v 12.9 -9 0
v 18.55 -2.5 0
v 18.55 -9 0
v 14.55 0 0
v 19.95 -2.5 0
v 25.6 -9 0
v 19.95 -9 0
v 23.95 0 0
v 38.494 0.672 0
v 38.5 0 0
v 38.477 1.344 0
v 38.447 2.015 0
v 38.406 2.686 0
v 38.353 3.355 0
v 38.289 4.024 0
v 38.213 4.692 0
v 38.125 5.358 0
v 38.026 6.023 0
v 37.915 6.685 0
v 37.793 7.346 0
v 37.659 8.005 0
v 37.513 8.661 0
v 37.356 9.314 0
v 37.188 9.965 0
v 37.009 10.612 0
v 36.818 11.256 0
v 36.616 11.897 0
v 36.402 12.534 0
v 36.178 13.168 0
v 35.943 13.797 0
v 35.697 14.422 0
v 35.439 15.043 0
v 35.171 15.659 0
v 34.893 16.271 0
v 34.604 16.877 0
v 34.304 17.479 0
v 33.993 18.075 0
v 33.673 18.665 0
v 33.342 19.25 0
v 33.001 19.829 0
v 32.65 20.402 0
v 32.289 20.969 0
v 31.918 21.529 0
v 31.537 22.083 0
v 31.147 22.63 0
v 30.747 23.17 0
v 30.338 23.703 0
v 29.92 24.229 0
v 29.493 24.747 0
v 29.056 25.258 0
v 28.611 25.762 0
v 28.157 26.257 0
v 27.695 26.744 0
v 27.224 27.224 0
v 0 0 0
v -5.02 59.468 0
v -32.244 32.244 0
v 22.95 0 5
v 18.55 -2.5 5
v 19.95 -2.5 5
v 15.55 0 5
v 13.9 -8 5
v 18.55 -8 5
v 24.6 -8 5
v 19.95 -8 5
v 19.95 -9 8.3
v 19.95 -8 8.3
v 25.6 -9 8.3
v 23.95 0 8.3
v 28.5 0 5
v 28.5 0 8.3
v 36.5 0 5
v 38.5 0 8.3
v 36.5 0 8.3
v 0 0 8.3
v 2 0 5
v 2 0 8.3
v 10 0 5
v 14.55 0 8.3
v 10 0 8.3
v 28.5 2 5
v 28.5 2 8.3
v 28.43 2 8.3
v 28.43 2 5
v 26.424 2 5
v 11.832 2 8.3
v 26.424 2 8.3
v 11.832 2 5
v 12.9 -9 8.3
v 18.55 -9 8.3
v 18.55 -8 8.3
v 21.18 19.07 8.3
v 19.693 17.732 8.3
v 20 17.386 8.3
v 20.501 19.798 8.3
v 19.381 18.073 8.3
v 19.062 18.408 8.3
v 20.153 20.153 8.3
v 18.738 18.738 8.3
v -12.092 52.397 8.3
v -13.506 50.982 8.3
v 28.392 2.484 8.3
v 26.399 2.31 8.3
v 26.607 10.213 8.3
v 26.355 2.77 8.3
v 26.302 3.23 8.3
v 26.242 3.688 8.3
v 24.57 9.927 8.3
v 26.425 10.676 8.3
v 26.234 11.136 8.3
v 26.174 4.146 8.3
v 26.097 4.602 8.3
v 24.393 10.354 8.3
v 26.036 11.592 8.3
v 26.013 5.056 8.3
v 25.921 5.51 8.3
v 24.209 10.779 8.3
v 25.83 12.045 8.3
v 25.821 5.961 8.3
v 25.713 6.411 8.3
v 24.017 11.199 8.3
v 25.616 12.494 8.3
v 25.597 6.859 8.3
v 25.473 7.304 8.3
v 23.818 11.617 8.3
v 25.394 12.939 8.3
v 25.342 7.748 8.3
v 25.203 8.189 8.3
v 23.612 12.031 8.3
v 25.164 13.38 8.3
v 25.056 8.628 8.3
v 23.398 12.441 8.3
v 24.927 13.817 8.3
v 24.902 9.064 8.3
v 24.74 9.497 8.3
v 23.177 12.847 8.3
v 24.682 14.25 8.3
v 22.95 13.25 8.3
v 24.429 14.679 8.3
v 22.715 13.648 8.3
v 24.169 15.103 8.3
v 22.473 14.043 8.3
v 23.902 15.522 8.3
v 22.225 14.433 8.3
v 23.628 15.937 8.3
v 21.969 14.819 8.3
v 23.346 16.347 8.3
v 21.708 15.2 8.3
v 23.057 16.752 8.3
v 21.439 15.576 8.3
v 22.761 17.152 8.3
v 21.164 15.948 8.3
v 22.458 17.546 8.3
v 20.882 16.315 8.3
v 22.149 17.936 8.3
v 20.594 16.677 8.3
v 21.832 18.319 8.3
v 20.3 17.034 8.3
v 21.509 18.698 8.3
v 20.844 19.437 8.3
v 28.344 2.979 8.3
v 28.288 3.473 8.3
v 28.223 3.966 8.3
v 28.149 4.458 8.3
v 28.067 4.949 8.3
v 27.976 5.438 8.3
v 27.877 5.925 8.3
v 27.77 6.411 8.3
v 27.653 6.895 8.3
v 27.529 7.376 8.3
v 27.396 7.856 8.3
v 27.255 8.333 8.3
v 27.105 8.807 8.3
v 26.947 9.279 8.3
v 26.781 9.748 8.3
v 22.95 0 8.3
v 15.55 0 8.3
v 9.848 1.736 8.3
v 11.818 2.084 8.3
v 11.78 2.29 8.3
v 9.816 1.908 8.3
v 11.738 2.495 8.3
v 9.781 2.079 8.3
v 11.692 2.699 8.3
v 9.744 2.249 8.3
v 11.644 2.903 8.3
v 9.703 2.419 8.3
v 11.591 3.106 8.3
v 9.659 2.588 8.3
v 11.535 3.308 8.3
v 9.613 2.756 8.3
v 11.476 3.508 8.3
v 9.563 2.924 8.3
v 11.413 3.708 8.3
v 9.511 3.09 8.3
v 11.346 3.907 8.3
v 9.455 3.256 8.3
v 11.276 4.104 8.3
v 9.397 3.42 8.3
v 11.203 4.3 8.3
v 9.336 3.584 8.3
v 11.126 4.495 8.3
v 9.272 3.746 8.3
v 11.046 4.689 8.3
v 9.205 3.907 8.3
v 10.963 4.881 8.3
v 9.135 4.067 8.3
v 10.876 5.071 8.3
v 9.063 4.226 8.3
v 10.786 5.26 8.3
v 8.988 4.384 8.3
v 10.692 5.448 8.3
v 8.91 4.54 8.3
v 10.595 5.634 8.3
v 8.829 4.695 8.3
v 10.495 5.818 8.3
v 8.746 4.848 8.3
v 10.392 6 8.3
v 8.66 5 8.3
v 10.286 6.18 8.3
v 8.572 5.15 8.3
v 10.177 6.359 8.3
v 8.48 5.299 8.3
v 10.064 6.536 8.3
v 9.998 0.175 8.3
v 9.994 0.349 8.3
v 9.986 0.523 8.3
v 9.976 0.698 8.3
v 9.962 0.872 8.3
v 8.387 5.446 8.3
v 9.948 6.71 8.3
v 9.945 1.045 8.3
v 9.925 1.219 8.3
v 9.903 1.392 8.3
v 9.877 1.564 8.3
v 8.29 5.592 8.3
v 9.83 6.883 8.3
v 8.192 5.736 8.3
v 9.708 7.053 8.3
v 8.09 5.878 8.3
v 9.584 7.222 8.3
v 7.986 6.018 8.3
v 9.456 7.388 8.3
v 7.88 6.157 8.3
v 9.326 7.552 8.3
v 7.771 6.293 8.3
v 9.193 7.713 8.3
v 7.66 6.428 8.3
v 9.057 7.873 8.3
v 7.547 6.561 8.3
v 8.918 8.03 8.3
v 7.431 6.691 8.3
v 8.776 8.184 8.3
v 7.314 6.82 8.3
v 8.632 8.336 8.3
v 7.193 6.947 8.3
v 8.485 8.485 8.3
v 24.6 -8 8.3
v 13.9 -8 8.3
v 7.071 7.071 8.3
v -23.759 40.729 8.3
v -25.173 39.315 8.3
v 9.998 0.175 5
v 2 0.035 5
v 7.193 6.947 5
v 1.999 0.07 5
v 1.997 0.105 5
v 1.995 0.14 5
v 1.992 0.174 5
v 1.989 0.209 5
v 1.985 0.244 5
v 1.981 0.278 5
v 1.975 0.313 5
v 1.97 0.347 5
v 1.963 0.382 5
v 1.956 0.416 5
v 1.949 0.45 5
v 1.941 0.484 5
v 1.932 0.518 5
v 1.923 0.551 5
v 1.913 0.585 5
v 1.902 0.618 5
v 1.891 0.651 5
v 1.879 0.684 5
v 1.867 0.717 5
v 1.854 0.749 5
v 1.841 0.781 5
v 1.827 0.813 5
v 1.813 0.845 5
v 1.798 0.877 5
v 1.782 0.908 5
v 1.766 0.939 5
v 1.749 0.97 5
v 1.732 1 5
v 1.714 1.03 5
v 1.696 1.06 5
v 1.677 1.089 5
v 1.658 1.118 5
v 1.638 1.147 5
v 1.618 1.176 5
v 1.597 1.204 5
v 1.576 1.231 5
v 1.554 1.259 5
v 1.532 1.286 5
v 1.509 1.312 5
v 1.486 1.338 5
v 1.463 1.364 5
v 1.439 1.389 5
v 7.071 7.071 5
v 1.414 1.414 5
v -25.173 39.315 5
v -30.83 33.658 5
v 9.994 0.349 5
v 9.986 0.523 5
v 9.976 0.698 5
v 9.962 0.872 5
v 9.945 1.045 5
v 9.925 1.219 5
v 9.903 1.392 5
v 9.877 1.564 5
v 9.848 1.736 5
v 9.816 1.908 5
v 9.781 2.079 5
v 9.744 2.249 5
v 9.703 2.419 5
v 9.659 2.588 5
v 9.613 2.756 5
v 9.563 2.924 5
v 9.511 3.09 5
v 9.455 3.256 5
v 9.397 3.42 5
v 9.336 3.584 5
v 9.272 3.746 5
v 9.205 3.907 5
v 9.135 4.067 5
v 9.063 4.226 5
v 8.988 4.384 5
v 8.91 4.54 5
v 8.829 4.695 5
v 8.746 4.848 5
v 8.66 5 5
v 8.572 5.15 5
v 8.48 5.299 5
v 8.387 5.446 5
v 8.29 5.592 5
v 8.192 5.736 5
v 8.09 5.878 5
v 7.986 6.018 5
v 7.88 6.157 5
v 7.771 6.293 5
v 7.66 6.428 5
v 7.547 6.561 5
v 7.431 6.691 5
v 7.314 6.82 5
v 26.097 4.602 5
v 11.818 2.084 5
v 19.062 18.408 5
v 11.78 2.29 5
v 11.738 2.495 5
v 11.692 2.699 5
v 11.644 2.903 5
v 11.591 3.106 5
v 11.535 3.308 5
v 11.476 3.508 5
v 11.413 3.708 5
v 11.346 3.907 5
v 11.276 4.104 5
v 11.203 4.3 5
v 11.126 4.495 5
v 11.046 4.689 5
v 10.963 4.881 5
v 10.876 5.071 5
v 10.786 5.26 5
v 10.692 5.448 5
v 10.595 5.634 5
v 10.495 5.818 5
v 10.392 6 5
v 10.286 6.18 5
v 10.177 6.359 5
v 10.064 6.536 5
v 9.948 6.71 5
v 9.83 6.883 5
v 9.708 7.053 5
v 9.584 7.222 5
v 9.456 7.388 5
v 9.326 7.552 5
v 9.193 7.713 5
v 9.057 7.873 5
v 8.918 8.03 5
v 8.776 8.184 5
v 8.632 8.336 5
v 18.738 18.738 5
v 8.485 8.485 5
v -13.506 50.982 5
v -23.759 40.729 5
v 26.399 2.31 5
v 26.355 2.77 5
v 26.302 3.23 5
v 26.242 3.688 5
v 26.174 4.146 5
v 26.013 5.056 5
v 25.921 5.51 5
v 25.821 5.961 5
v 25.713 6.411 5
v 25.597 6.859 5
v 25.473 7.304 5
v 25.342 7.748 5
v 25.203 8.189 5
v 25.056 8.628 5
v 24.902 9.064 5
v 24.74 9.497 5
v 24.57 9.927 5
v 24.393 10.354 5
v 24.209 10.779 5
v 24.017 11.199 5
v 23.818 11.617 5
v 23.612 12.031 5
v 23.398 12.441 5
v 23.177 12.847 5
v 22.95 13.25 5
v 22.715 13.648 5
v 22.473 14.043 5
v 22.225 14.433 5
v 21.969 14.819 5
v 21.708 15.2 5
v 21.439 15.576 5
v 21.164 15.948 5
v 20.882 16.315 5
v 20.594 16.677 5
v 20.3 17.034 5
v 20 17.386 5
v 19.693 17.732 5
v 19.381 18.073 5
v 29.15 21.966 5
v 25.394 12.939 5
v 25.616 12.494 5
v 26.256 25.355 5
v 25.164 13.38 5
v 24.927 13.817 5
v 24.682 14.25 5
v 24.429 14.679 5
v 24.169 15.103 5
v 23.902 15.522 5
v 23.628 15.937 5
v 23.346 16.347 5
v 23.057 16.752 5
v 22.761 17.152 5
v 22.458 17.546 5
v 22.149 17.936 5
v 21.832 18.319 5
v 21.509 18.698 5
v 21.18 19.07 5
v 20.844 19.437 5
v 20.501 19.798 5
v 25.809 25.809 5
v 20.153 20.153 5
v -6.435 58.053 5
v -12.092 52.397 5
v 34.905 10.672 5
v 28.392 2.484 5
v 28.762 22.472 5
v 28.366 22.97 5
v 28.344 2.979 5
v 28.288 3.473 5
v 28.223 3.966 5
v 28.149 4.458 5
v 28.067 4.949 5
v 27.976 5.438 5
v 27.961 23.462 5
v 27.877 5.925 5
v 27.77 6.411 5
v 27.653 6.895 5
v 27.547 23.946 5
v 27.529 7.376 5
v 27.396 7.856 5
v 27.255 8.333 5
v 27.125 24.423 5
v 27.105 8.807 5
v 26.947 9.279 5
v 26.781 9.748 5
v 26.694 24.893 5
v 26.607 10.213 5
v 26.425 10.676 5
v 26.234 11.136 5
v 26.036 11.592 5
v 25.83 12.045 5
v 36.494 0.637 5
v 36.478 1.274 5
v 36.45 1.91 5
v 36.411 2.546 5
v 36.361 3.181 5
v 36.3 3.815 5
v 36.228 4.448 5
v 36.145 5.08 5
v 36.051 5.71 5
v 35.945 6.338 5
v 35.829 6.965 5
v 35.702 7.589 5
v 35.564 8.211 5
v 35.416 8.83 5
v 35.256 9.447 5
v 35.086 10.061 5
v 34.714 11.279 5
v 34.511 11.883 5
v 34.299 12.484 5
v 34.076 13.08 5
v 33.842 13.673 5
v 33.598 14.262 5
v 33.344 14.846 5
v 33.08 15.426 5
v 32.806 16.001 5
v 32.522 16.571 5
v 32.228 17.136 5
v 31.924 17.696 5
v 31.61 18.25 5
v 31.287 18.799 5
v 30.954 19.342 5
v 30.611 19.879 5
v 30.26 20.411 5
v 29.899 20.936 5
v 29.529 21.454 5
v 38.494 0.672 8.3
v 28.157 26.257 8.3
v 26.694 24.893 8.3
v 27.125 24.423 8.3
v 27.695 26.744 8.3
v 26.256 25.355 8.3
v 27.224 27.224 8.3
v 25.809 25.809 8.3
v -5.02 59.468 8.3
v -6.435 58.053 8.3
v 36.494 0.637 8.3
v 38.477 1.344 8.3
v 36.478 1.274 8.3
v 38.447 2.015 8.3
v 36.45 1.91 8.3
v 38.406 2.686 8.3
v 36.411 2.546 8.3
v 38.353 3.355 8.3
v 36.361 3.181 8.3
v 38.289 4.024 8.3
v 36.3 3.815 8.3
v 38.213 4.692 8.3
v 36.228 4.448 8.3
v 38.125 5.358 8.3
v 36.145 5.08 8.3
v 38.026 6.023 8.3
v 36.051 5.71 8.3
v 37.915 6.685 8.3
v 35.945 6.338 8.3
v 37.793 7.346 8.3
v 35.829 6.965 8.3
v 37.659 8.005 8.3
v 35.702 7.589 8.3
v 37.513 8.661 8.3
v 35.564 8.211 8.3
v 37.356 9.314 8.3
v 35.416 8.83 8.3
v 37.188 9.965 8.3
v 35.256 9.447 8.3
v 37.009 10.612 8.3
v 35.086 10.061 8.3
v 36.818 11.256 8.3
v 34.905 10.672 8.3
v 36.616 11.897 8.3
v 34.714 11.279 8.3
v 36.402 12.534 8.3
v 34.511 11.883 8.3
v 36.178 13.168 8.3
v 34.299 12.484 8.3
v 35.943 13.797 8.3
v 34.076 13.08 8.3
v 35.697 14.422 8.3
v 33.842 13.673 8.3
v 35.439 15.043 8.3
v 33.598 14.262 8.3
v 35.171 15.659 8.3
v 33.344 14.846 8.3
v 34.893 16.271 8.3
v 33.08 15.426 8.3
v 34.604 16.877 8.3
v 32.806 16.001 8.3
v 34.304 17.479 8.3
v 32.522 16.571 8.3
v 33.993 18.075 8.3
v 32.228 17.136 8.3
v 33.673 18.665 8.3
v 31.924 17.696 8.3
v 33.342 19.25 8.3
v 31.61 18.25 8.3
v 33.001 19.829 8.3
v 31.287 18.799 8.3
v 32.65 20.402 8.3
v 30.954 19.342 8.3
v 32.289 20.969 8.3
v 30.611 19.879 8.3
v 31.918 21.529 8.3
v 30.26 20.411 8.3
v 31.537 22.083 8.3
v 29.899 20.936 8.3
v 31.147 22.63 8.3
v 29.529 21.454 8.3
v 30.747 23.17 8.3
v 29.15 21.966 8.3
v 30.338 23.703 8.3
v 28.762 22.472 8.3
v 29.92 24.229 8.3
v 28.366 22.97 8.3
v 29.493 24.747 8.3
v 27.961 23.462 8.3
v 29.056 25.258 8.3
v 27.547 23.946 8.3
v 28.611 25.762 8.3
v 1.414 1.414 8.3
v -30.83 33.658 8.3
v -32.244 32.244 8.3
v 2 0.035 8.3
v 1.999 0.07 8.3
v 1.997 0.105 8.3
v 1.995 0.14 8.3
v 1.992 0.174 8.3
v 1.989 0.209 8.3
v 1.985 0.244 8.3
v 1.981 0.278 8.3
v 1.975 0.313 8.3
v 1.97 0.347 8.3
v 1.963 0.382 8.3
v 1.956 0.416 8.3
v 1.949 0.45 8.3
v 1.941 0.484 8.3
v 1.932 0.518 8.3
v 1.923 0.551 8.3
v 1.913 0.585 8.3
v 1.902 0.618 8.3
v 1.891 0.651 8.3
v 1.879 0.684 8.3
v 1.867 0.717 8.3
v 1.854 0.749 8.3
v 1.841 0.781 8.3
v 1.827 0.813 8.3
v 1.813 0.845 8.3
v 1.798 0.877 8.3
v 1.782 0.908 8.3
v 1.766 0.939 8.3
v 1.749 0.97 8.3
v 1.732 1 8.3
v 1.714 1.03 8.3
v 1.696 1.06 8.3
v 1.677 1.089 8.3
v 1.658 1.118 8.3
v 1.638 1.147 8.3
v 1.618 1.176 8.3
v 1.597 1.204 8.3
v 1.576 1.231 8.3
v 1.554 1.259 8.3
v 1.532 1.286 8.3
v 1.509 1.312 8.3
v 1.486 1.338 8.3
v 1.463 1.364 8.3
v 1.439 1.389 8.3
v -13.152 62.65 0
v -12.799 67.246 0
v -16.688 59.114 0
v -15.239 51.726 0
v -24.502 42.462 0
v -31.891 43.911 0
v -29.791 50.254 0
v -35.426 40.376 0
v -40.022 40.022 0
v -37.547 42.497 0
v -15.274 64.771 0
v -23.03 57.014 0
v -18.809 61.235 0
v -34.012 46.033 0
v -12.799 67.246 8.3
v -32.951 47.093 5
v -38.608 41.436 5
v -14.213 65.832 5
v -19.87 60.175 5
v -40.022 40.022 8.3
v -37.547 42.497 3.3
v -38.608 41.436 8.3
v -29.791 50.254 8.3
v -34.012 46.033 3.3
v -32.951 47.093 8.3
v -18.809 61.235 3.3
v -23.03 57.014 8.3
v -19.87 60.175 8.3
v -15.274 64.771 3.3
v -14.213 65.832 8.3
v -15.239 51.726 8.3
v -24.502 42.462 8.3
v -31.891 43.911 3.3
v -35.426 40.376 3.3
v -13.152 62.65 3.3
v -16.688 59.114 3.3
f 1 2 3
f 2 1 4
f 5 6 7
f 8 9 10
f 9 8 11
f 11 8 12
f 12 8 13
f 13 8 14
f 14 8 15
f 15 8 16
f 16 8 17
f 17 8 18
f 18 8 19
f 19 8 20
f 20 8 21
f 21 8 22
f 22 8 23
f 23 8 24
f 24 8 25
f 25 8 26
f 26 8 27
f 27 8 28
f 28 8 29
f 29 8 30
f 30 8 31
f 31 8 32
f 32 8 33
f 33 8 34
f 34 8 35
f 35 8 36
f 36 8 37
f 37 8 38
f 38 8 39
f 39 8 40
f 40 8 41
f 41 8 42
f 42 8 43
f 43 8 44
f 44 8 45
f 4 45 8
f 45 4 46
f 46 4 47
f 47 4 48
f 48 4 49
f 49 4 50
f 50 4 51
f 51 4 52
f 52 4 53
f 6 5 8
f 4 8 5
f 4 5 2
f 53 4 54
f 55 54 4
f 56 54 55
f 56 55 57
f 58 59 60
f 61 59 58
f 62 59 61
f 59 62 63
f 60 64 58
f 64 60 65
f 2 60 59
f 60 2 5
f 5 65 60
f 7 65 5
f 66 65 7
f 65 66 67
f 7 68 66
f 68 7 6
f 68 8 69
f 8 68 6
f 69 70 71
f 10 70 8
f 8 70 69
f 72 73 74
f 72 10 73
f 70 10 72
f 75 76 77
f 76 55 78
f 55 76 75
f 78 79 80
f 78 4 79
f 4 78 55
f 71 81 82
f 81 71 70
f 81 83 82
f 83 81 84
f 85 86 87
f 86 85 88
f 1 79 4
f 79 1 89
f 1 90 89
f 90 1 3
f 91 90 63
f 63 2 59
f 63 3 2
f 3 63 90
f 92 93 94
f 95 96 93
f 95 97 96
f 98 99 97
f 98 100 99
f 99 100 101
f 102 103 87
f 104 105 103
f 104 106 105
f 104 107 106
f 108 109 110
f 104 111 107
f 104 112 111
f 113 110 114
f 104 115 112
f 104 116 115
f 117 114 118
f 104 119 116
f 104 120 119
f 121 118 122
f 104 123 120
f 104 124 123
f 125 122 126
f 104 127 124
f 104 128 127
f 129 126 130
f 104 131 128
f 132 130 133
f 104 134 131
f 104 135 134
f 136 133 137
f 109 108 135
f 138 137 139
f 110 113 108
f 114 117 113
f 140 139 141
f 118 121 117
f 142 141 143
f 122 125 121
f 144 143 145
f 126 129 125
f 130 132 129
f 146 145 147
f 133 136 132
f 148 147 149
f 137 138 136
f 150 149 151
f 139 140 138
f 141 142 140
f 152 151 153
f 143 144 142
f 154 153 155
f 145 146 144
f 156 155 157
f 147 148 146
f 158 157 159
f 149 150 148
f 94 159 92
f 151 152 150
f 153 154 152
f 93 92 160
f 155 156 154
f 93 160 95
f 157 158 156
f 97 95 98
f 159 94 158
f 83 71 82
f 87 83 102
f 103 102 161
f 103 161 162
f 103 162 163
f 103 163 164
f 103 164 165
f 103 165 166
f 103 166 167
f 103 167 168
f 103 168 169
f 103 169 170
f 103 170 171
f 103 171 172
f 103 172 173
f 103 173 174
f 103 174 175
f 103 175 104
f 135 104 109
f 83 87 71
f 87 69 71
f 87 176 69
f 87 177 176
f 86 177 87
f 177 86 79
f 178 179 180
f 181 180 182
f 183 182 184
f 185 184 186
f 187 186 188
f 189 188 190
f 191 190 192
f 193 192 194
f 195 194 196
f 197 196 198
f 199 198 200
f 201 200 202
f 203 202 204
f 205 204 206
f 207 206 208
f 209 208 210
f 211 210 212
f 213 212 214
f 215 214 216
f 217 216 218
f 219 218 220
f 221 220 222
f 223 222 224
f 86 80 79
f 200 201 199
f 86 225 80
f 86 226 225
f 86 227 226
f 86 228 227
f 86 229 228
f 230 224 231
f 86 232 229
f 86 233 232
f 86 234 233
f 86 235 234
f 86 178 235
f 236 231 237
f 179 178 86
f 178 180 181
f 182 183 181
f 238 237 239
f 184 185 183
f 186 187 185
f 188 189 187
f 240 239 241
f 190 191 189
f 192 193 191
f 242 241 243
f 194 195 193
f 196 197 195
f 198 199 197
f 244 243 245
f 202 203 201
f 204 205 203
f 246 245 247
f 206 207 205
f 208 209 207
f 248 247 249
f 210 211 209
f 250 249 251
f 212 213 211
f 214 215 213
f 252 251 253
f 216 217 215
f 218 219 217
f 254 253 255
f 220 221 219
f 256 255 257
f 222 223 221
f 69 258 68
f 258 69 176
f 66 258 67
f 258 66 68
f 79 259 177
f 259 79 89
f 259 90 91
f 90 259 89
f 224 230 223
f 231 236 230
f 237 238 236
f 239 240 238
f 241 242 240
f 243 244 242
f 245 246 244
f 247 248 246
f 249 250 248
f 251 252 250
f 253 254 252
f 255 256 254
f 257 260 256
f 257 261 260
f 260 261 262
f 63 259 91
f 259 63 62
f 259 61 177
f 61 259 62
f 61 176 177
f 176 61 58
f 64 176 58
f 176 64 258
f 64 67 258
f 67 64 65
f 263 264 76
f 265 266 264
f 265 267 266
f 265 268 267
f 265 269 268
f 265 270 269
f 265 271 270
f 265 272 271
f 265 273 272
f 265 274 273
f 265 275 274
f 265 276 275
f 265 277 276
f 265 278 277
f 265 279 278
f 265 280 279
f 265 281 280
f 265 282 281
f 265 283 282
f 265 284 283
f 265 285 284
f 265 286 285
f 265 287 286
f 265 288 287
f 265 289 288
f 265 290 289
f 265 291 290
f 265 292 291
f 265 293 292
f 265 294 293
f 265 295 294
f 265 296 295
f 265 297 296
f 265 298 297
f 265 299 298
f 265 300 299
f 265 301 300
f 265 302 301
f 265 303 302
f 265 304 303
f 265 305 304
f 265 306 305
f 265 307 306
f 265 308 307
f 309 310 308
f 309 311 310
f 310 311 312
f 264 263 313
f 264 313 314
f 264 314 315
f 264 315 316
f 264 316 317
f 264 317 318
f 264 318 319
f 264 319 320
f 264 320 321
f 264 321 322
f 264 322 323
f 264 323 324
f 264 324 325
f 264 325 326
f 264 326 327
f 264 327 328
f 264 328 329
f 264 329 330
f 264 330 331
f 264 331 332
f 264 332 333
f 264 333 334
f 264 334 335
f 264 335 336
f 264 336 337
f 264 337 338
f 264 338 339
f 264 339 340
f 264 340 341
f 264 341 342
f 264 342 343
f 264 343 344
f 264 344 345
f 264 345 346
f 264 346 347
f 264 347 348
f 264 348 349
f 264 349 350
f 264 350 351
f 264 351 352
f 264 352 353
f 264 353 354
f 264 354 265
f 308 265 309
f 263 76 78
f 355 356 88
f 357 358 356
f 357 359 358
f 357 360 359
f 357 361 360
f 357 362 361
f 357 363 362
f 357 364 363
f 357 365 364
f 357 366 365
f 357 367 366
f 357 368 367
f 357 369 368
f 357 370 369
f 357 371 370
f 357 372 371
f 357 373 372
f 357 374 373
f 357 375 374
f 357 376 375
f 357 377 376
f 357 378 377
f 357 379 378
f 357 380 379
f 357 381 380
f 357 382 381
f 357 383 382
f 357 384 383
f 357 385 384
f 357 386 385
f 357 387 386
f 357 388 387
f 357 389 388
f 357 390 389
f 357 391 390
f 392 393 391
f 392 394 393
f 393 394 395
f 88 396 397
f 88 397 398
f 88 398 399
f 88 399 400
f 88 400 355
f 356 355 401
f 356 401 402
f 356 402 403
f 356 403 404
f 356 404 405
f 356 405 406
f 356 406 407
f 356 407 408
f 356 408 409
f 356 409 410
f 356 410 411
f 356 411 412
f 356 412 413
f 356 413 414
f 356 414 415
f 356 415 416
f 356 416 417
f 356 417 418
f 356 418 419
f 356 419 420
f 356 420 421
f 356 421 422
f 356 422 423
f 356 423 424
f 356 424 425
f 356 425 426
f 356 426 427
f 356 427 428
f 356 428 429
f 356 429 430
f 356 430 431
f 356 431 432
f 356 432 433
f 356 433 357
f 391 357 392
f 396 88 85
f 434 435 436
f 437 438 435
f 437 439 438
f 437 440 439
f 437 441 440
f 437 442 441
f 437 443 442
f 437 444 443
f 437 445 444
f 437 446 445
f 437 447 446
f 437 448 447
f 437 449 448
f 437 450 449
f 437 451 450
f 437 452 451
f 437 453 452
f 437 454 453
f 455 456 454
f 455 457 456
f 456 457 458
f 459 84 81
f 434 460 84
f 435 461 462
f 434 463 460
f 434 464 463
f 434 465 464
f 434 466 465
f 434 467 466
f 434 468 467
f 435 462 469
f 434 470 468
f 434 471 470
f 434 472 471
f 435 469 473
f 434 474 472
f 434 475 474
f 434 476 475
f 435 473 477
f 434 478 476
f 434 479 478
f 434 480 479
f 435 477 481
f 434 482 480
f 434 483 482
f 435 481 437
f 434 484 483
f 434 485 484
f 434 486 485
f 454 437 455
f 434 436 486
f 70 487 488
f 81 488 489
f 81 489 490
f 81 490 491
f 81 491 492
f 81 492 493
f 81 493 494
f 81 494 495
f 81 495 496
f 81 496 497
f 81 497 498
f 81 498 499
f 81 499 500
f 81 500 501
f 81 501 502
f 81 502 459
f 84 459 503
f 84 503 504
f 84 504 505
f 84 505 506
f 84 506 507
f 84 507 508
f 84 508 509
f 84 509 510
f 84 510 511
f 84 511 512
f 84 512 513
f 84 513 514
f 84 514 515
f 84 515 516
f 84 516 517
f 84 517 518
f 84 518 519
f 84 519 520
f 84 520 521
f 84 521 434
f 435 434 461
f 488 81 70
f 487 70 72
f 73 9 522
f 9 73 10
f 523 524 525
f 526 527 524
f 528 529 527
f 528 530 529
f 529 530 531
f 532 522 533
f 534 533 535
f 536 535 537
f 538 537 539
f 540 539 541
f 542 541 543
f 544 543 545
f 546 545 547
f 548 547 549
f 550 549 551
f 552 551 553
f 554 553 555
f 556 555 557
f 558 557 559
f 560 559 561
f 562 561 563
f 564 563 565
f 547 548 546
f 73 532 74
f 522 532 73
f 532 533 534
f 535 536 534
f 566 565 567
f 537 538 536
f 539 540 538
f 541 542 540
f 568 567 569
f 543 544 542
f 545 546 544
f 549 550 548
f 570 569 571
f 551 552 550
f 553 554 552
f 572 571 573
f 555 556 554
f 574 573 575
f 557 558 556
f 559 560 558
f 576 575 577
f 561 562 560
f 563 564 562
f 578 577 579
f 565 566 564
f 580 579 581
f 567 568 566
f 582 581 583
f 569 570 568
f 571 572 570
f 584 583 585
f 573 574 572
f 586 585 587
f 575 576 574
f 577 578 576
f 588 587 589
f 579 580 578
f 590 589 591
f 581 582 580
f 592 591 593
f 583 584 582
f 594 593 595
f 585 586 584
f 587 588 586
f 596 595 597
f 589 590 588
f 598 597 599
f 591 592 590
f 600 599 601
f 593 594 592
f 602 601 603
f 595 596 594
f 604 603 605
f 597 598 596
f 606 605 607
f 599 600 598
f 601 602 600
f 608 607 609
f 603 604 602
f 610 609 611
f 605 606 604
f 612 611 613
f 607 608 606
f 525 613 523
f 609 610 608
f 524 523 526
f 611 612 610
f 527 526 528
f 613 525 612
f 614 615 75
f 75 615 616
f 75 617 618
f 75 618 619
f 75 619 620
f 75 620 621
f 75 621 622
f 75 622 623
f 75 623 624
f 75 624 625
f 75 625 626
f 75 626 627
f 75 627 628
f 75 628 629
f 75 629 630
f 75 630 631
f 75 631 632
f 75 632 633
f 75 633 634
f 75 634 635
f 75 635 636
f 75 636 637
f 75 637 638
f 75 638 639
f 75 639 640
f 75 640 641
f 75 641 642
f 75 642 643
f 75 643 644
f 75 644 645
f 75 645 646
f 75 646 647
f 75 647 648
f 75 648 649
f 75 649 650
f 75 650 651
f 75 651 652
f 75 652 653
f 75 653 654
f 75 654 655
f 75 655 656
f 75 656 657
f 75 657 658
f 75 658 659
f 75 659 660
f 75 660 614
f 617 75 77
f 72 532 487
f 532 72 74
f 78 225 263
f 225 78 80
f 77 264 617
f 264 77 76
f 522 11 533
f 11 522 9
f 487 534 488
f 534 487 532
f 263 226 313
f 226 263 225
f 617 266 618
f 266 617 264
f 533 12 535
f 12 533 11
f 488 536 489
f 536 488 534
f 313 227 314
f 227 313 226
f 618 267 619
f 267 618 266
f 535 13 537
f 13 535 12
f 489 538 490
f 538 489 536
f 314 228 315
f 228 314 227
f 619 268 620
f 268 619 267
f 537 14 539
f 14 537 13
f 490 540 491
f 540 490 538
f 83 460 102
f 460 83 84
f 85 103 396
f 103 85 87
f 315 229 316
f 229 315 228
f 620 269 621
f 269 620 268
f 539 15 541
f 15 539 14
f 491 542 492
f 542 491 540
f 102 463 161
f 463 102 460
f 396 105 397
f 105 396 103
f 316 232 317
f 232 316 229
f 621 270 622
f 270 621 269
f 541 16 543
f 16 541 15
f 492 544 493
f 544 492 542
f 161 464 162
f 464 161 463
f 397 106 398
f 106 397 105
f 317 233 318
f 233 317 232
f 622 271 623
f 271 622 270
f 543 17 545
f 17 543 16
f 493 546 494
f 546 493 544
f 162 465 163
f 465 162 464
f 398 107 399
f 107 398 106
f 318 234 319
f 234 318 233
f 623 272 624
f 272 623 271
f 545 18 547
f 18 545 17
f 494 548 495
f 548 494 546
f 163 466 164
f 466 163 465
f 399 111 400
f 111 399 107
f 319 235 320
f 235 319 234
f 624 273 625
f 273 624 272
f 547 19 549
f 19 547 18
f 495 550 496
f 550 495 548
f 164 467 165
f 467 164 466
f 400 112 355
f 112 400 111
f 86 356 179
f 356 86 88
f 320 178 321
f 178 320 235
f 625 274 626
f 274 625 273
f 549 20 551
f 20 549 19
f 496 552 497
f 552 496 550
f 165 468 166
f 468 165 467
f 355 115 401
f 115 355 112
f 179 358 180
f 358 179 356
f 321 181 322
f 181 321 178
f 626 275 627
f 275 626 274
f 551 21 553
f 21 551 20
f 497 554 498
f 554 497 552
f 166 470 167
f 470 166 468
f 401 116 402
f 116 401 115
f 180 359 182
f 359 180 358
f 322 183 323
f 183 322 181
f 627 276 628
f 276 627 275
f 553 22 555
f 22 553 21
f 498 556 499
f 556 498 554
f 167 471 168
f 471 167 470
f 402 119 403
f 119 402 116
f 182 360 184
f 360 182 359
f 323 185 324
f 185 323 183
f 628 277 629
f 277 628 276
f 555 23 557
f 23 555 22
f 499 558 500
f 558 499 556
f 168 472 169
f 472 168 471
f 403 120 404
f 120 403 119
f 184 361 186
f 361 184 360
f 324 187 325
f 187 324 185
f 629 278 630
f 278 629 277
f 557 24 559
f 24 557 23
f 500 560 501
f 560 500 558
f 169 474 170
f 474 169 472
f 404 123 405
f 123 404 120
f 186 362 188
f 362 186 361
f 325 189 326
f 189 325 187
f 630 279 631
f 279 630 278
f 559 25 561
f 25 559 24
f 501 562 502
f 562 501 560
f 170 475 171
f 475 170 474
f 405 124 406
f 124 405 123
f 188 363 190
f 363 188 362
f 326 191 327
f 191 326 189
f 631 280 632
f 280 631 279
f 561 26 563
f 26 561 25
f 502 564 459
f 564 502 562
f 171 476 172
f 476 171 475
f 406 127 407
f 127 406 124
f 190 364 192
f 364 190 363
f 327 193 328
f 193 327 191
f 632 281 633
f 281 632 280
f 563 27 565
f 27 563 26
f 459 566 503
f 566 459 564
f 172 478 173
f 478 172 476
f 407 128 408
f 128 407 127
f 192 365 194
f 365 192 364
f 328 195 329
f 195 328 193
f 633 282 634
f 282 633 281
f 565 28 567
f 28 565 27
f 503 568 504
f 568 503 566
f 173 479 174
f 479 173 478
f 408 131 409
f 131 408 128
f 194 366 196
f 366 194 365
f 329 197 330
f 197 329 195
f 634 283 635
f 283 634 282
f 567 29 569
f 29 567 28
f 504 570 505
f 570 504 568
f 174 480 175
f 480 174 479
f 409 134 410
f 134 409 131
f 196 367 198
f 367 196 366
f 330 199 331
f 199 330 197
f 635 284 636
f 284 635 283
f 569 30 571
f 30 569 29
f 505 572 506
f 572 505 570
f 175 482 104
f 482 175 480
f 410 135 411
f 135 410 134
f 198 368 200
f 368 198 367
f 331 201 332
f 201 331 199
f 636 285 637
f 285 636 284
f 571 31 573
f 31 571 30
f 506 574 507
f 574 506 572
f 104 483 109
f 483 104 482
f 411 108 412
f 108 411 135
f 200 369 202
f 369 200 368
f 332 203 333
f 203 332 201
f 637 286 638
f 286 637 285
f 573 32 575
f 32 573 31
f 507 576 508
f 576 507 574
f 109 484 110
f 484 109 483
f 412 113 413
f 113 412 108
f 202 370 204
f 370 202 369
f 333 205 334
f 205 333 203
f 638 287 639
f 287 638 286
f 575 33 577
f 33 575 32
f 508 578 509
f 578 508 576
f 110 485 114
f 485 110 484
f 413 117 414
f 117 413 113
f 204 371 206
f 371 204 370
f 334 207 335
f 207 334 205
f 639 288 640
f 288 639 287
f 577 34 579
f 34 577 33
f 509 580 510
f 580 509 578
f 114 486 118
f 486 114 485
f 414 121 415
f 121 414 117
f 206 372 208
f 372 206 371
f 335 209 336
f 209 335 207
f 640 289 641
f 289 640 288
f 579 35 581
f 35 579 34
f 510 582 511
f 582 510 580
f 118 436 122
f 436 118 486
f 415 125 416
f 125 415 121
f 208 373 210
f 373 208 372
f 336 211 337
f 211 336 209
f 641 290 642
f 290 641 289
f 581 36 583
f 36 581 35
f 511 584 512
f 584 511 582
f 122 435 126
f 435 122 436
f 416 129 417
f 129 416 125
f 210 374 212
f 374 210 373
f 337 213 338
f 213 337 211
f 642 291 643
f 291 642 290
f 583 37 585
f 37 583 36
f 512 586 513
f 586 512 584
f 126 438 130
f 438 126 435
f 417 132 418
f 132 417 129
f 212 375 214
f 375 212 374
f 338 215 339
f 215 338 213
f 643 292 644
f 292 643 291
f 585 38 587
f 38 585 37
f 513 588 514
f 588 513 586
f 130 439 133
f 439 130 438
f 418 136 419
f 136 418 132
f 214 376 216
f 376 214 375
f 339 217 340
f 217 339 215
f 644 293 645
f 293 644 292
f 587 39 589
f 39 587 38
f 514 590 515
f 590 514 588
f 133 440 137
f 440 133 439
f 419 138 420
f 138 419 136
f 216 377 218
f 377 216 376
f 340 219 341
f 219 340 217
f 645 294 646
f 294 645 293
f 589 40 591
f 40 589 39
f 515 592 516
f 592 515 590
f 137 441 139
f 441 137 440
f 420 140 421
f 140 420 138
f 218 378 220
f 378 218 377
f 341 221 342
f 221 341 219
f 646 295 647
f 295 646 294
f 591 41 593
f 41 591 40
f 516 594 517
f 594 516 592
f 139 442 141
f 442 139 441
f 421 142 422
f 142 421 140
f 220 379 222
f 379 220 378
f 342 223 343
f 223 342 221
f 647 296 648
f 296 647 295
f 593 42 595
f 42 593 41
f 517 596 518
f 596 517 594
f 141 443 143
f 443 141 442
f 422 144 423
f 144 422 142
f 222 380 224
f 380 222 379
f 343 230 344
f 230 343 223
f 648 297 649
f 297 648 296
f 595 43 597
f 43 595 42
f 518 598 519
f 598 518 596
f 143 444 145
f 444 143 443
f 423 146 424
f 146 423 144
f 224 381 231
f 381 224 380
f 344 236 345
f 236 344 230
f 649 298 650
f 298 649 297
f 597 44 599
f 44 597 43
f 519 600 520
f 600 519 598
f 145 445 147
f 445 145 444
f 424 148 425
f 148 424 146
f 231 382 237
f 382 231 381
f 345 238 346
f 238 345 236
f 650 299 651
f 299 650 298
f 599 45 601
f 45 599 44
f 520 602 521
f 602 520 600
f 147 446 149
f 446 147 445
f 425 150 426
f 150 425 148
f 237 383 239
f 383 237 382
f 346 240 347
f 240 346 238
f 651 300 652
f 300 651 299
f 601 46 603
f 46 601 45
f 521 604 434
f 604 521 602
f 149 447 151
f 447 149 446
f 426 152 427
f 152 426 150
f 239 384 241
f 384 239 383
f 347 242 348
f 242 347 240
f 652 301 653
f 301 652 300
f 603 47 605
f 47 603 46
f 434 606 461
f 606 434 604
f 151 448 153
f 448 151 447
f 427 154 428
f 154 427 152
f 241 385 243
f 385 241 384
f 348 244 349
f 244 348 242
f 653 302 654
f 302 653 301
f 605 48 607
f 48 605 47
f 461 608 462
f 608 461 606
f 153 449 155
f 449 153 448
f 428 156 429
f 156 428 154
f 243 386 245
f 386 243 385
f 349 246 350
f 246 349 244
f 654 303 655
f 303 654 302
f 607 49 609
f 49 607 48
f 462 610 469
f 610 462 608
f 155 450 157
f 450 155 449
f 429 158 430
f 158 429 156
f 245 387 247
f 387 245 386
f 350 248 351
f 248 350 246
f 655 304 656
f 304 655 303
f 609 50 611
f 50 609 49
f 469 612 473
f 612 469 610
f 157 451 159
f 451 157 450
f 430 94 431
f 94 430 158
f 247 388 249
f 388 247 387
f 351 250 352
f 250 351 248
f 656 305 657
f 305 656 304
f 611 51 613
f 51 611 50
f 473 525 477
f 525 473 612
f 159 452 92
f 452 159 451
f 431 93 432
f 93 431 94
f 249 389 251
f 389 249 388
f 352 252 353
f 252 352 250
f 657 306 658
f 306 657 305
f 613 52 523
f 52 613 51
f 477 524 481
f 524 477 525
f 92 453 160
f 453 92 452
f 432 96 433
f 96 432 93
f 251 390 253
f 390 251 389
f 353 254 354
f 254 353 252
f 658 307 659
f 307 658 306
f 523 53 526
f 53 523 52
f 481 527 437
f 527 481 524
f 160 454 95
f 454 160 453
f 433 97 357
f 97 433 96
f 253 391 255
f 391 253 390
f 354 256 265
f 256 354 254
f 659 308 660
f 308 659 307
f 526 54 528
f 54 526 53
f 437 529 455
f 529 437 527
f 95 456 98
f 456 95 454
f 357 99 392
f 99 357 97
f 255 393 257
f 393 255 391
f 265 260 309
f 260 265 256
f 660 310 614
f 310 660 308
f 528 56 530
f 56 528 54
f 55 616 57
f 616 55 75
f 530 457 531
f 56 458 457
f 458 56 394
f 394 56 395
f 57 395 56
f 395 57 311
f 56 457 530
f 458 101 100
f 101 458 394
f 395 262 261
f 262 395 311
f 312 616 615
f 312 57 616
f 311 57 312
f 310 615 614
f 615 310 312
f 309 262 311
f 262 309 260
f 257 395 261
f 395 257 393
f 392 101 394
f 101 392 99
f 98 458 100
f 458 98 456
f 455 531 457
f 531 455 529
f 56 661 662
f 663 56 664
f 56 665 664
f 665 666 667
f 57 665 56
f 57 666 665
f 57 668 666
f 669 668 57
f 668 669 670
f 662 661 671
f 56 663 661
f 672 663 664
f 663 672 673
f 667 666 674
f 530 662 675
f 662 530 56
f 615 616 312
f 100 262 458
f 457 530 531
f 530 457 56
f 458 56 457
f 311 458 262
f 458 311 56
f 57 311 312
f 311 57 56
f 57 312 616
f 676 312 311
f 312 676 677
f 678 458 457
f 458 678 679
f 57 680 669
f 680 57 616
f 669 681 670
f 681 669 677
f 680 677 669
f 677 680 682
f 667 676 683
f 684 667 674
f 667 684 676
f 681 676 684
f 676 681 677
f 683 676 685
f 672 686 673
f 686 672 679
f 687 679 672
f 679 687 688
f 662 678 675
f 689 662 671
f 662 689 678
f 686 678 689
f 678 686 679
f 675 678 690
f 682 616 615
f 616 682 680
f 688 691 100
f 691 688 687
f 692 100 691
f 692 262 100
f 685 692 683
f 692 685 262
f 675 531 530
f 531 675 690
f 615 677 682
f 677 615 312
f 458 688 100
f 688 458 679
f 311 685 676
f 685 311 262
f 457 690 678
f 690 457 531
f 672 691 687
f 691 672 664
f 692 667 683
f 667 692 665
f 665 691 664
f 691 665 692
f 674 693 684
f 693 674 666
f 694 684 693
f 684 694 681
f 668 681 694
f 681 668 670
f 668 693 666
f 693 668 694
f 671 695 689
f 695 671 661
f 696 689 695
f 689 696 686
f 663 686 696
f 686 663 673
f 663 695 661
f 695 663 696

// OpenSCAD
//
// ktRAIL2
//

gap1 = 0.001;
gap2 = 0.002;
m = 8;
w = 38.2+0.3;
t = 2;
h = 8.3;
h2 = 5;
h3 = h-h2;





//translate( [-40, 40, 0] ) rotate( [0, 0, 45] ) cube( [w, 50, h] );
//translate( [0, -50, 0] ) cube( [w, 50, h] );
joint_m();
/*istep = 1;
inr = 57;
ined = 56;
ostep = 0.1;
outr = 300;
outed = 8.6;
curve_r(inr, 0, ined, istep);
    difference()
    {
    union()
    {
        translate( [-40, 40, 0] ) rotate( [0, 0, 45] ) joint_fw();
        translate( [(inr-w)*cos(ined)-(inr-w), (inr-w)*sin(ined), 0] ) rotate( [0, 0, ined] ) curve_l(outr, 0, outed, ostep, 0);
    }
    translate( [-40, 40, -gap1] ) rotate( [0, 0, 45] )
    {
        cube( [w+10, 50, h+gap2] );
        joint_f();
        translate( [t+m/2-5/2, -3, 0] ) cube( [5, 3, h3] );
        translate( [w-(t+m/2)-5/2, -3, 0] ) cube( [5, 3, h3] );
    }
}*/
istep = 1;
inr = w;
ined = 45;
curve_r(inr, 0, ined, istep);
translate( [(inr-w)*cos(ined)-(inr-w), (inr-w)*sin(ined), 0] ) rotate( [0, 0, ined] )
{
    straight(56.6-11);
    translate( [0, 56.6-11, 0] )
    {
        difference()
        {
            straight(11,1);
            translate( [0, 11, 0] ) joint_f();
            #translate( [t+m/2-5/2, 11-3, 0] ) cube( [5, 3, h3] );
            #translate( [w-(t+m/2)-5/2, 11-3, 0] ) cube( [5, 3, h3] );
        }
    }
}

module curve_l(r=w, start=0, end=90, step=1, f=0)
{
    a0b = -(r-w);
    a0a = -(r);
    c0b = -(r-w);
    c0a = -(r-w+t);
    c1b = -(r-w+t+m);
    c1a = -(r-w+t+t+m);
    c2b = -(r-t-m-t);
    c2a = -(r-t-m);
    c3b = -(r-t);
    c3a = -(r);
    c4b = -(r-w+t+t+m);
    c4a = -(r-t-m-t);
    
    for( i=[-start: -step: -end+1] )
    {
        a0 = [[a0a*cos(i),a0a*sin(i)],[a0b*cos(i),a0b*sin(i)],[a0b*cos(i-step),a0b*sin(i-step)],[a0a*cos(i-step),a0a*sin(i-step)]];
        b0 = [0,1,2,3];
        a = concat( a0 );
        b = [b0];
        translate( [r, 0, 0] ) linear_extrude( height=h2 ) polygon( a, b );
        
        c0 = [[c0a*cos(i),c0a*sin(i)],[c0b*cos(i),c0b*sin(i)],[c0b*cos(i-step),c0b*sin(i-step)],[c0a*cos(i-step),c0a*sin(i-step)]];
        d0 = [0,1,2,3];
        c1 = [[c1a*cos(i),c1a*sin(i)],[c1b*cos(i),c1b*sin(i)],[c1b*cos(i-step),c1b*sin(i-step)],[c1a*cos(i-step),c1a*sin(i-step)]];
        d1 = [4,5,6,7];
        c2 = [[c2a*cos(i),c2a*sin(i)],[c2b*cos(i),c2b*sin(i)],[c2b*cos(i-step),c2b*sin(i-step)],[c2a*cos(i-step),c2a*sin(i-step)]];
        d2 = [8,9,10,11];
        c3 = [[c3a*cos(i),c3a*sin(i)],[c3b*cos(i),c3b*sin(i)],[c3b*cos(i-step),c3b*sin(i-step)],[c3a*cos(i-step),c3a*sin(i-step)]];
        d3 = [12,13,14,15];
        c4 = [[c4a*cos(i),c4a*sin(i)],[c4b*cos(i),c4b*sin(i)],[c4b*cos(i-step),c4b*sin(i-step)],[c4a*cos(i-step),c4a*sin(i-step)]];
        d4 = [16,17,18,19];

        if (f==1)
        {
            c = concat( c0, c1, c2, c3, c4 );
            d = [d0,d1,d2,d3,d4];
            translate( [r, 0, h2] ) linear_extrude( height=h3 ) polygon( c, d );
        }
        else
        {
            c = concat( c0, c1, c2, c3 );
            d = [d0,d1,d2,d3];
            translate( [r, 0, h2] ) linear_extrude( height=h3 ) polygon( c, d );
        }
    }
}


module curve_r(r=w, start=0, end=90, step=1, f=0)
{
    a0a = r-w;
    a0b = r;
    c0a = r-w;
    c0b = r-w+t;
    c1a = r-w+t+m;
    c1b = r-w+t+t+m;
    c2a = r-t-m-t;
    c2b = r-t-m;
    c3a = r-t;
    c3b = r;
    c4a = r-w+t+t+m;
    c4b = r-t-m-t;
    
    for( i=[start: step: end-1] )
    {
        a0 = [[a0a*cos(i),a0a*sin(i)],[a0b*cos(i),a0b*sin(i)],[a0b*cos(i+step),a0b*sin(i+step)],[a0a*cos(i+step),a0a*sin(i+step)]];
        b0 = [0,1,2,3];
        a = concat( a0 );
        b = [b0];
        translate( [-r+w, 0, 0] ) linear_extrude( height=h2 ) polygon( a, b );
        
        c0 = [[c0a*cos(i),c0a*sin(i)],[c0b*cos(i),c0b*sin(i)],[c0b*cos(i+step),c0b*sin(i+step)],[c0a*cos(i+step),c0a*sin(i+step)]];
        d0 = [0,1,2,3];
        c1 = [[c1a*cos(i),c1a*sin(i)],[c1b*cos(i),c1b*sin(i)],[c1b*cos(i+step),c1b*sin(i+step)],[c1a*cos(i+step),c1a*sin(i+step)]];
        d1 = [4,5,6,7];
        c2 = [[c2a*cos(i),c2a*sin(i)],[c2b*cos(i),c2b*sin(i)],[c2b*cos(i+step),c2b*sin(i+step)],[c2a*cos(i+step),c2a*sin(i+step)]];
        d2 = [8,9,10,11];
        c3 = [[c3a*cos(i),c3a*sin(i)],[c3b*cos(i),c3b*sin(i)],[c3b*cos(i+step),c3b*sin(i+step)],[c3a*cos(i+step),c3a*sin(i+step)]];
        d3 = [12,13,14,15];
        c4 = [[c4a*cos(i),c4a*sin(i)],[c4b*cos(i),c4b*sin(i)],[c4b*cos(i+step),c4b*sin(i+step)],[c4a*cos(i+step),c4a*sin(i+step)]];
        d4 = [16,17,18,19];

        if (f==1)
        {
            c = concat( c0, c1, c2, c3, c4 );
            d = [d0,d1,d2,d3,d4];
            translate( [-r+w, 0, h2] ) linear_extrude( height=h3 ) polygon( c, d );
        }
        else
        {
            c = concat( c0, c1, c2, c3 );
            d = [d0,d1,d2,d3];
            translate( [-r+w, 0, h2] ) linear_extrude( height=h3 ) polygon( c, d );
        }
    }
}


module curve_r2(r=w, start=0, end=90, step=1, f=0)
{
    a0a = r-w;
    a0b = r;
    c0a = r-w;
    c0b = r-w+t;
    c1a = r-w+t+m;
    c1b = r-w+t+t+m;
    c2a = r-t-m-t;
    c2b = r-t-m;
    c3a = r-t;
    c3b = r;
    c4a = r-w+t+t+m;
    c4b = r-t-m-t;
    
    for( i=[start: step: end-1] )
    {
        a0 = [[a0a*cos(i),a0a*sin(i)],[a0b*cos(i),a0b*sin(i)],[a0b*cos(i+step),a0b*sin(i+step)],[a0a*cos(i+step),a0a*sin(i+step)]];
        b0 = [0,1,2,3];
        a = concat( a0 );
        b = [b0];
        translate( [-r+w, 0, 0] ) linear_extrude( height=h2 ) polygon( a, b );
        
        c0 = [[c0a*cos(i),c0a*sin(i)],[c0b*cos(i),c0b*sin(i)],[c0b*cos(i+step),c0b*sin(i+step)],[c0a*cos(i+step),c0a*sin(i+step)]];
        d0 = [0,1,2,3];
        c3 = [[c3a*cos(i),c3a*sin(i)],[c3b*cos(i),c3b*sin(i)],[c3b*cos(i+step),c3b*sin(i+step)],[c3a*cos(i+step),c3a*sin(i+step)]];
        d3 = [4,5,6,7];
        c4 = [[c4a*cos(i),c4a*sin(i)],[c4b*cos(i),c4b*sin(i)],[c4b*cos(i+step),c4b*sin(i+step)],[c4a*cos(i+step),c4a*sin(i+step)]];
        d4 = [8,9,10,11];

        if (f==1)
        {
            c = concat( c0, c3, c4 );
            d = [d0,d3,d4];
            translate( [-r+w, 0, h2] ) linear_extrude( height=h3 ) polygon( c, d );
        }
        else
        {
            c = concat( c0, c3 );
            d = [d0,d3];
            translate( [-r+w, 0, h2] ) linear_extrude( height=h3 ) polygon( c, d );
        }
    }
}


module straight(l, f=0)
{
    a0 = [[0,0],[w,0],[w,l],[0,l]];
    b0 = [0,1,2,3];
    a = concat( a0 );
    b = [b0];
    translate( [0, 0, 0] ) linear_extrude( height=h2 ) polygon( a, b );
    
    c0 = [[0,0],[t,0],[t,l],[0,l]];
    d0 = [0,1,2,3];
    c1 = [[t+m,0],[t+m+t,0],[t+m+t,l],[t+m,l]];
    d1 = [4,5,6,7];
    c2 = [[w-t-m-t,0],[w-t-m,0],[w-t-m,l],[w-t-m-t,l]];
    d2 = [8,9,10,11];
    c3 = [[w-t,0],[w,0],[w,l],[w-t,l]];
    d3 = [12,13,14,15];
    c4 = [[t+m+t,0],[w-t-m-t,0],[w-t-m-t,l],[t+m+t,l]];
    d4 = [16,17,18,19];

    if (f==1)
    {
        c = concat( c0, c1, c2, c3, c4 );
        d = [d0,d1,d2,d3,d4];
        translate( [0, 0, h2] ) linear_extrude( height=h3 ) polygon( c, d );
    }
    else
    {
        c = concat( c0, c1, c2, c3 );
        d = [d0,d1,d2,d3];
        translate( [0, 0, h2] ) linear_extrude( height=h3 ) polygon( c, d );
    }
}

module joint_m()
{
    a0 = [[9.25,t],[9.25,0],[4.7,0],[6.35,-9],[0.7,-9],[0.7,-2.5],[-0.7,-2.5],[-0.7,-9],[-6.35,-9],[-4.7,0],[-9.25,0],[-9.25,t]];
    b0 = [0,1,2,3,4,5,6,7,8,9,10,11];
    a1 = [[4.7-t*0.5,0],[6.35-t*0.5,-9+t*0.5],[0.7,-9+t*0.5],[0.7,-2.5],[-0.7,-2.5],[-0.7,-9+t*0.5],[-6.35+t*0.5,-9+t*0.5],[-4.7+t*0.5,0]];
    b1 = [12,13,14,15,16,17,18,19,20];
    a = concat( a0 );
    b = [b0];
    c = concat( a0, a1 );
    d = [b0, b1];
    translate( [w/2, 0, 0] ) linear_extrude( height=h2 ) polygon( a, b );
    translate( [w/2, 0, h2] ) linear_extrude( height=h3 ) polygon( c, d );
}

module joint_f()
{
    a0 = [[4.78,0],[6.55,-9.25],[-6.55,-9.25],[-4.78,0]];
    b0 = [0,1,2,3];
    a = concat( a0 );
    b = [b0];
    translate( [w/2, gap1, -gap1] ) linear_extrude( height=h+gap2 ) polygon( a, b );
}

module joint_fw()
{
    a0 = [[8,0],[8.5,-12],[-7,-12],[-7.5,0]];
    b0 = [0,1,2,3];
    a = concat( a0 );
    b = [b0];
    translate( [w/2, gap1, 0] ) linear_extrude( height=h ) polygon( a, b );
}
